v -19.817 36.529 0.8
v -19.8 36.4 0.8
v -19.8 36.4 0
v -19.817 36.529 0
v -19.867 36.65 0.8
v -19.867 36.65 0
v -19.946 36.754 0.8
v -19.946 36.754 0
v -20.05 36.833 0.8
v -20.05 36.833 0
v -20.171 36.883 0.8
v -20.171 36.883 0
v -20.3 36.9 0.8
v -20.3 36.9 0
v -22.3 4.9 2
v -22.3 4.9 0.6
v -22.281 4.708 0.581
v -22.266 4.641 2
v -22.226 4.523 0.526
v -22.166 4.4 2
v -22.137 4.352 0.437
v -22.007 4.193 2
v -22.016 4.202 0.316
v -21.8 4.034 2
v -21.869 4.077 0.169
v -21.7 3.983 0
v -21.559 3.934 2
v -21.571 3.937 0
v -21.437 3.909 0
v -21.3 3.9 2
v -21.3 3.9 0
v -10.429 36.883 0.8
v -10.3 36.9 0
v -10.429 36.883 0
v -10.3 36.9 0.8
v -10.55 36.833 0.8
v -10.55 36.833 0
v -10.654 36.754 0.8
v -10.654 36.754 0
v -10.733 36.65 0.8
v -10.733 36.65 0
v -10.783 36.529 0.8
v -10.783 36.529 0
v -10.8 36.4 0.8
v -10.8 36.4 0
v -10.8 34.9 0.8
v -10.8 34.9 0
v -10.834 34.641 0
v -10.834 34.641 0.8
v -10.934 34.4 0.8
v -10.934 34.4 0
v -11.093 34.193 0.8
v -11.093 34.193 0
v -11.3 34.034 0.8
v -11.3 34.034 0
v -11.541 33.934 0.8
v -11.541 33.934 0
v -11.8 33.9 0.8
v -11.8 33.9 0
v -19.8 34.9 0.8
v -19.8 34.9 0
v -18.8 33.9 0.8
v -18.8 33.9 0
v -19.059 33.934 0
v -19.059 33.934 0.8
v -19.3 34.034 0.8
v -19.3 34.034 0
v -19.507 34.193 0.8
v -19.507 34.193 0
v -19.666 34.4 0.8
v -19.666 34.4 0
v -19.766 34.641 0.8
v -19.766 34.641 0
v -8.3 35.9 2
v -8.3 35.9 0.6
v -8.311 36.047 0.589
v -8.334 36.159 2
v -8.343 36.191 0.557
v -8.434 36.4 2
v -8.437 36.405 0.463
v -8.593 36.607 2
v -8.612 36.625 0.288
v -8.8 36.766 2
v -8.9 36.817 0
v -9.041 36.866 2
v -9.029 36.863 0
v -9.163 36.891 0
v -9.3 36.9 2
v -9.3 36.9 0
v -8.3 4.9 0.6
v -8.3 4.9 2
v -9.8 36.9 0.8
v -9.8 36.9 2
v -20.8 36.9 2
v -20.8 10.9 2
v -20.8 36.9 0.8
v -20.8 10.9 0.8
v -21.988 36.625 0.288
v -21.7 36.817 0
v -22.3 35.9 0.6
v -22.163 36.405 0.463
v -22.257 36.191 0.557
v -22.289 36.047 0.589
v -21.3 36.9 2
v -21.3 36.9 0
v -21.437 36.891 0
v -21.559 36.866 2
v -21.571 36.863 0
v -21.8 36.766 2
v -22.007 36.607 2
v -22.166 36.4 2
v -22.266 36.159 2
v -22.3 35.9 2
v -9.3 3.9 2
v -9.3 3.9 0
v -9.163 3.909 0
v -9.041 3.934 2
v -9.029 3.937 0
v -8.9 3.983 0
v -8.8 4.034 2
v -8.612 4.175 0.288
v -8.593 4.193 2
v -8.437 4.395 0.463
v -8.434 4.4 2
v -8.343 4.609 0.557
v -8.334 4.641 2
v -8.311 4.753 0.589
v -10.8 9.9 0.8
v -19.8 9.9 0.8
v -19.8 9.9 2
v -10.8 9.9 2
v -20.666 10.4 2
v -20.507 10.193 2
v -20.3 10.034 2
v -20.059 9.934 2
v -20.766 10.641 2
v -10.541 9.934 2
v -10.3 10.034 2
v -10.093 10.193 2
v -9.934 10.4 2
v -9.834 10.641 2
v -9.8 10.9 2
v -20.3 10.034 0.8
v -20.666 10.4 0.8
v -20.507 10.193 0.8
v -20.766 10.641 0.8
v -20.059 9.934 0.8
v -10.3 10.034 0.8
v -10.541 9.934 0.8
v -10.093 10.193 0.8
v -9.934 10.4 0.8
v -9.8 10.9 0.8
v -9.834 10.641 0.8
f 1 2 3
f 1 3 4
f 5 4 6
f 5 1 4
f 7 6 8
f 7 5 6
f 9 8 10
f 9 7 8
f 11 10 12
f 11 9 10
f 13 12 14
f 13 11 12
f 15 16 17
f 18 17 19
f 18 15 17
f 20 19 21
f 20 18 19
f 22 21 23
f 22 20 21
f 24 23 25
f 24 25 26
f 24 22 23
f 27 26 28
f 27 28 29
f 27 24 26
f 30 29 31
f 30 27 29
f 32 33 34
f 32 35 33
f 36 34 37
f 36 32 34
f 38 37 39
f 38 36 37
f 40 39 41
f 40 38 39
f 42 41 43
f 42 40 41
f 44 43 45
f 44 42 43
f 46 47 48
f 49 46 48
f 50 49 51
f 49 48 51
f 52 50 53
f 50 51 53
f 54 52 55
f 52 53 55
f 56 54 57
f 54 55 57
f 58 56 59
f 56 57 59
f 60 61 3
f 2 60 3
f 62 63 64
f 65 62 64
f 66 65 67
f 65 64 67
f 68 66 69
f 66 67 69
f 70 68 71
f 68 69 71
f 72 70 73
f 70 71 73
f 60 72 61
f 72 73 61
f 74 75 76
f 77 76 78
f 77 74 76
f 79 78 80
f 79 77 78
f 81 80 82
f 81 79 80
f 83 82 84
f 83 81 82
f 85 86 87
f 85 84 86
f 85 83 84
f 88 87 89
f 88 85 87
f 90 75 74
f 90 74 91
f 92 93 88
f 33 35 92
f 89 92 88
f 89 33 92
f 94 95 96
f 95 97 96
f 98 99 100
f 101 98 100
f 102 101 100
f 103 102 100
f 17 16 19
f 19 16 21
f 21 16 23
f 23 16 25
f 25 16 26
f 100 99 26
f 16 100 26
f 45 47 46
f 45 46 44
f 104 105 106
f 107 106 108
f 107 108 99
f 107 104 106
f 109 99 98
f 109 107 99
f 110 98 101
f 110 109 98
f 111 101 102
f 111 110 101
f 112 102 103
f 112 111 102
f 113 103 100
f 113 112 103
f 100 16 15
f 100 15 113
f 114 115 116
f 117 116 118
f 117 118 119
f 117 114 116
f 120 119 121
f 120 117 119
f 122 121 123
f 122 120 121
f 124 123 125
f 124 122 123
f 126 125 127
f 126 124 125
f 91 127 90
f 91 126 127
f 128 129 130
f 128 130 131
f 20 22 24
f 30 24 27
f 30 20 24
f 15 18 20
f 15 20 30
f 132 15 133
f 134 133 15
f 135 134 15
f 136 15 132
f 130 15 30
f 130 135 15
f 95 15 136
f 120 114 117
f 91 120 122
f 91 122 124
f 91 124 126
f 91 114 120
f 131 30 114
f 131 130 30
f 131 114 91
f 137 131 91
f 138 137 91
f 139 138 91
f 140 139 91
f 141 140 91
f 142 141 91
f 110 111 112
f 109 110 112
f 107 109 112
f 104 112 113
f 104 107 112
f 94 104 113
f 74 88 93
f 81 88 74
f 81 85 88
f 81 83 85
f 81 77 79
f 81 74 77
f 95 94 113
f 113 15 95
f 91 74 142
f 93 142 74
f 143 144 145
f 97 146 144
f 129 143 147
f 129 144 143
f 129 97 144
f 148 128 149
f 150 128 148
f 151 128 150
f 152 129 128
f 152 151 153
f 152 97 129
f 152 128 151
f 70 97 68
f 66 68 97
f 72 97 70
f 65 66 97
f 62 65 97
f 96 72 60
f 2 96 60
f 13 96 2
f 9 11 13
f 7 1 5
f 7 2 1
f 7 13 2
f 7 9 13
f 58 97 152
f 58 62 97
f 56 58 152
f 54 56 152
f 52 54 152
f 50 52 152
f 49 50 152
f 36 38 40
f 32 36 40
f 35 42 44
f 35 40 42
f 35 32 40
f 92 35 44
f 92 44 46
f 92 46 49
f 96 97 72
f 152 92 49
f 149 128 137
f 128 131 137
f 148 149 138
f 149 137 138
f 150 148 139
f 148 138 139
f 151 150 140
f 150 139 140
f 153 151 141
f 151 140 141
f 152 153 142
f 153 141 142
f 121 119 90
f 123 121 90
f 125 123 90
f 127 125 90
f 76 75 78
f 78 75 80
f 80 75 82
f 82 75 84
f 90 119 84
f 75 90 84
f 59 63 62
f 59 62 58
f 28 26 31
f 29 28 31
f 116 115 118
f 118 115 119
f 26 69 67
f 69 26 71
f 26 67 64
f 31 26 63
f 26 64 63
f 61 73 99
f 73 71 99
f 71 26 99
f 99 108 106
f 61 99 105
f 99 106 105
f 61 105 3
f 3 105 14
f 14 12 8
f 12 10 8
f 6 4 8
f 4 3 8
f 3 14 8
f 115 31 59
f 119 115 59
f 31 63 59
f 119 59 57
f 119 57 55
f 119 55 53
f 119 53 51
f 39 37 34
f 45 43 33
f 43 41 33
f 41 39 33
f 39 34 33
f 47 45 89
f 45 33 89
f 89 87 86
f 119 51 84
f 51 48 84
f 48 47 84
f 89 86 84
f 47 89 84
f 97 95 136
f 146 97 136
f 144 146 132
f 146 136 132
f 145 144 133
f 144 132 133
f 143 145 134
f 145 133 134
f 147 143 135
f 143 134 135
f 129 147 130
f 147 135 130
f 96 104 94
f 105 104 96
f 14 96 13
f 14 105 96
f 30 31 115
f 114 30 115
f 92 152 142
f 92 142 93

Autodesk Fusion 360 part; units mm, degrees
sketch "mriya-niceview-holder" plane through (0, 0, 0) normal (0, 0, 1) x (1, 0, 0)
  line L0 (-20.8, 9.9) -> (-9.8, 9.9)
  line L1 (-9.8, 9.9) -> (-9.8, 36.9)
  line L2 (-22.3, 3.9) -> (-22.3, 36.9)
  line L3 (-20.8, 9.9) -> (-20.8, 36.9)
  line L4 (-8.3, 36.9) -> (-8.3, 3.9)
  line L5 (-22.3, 36.9) -> (-19.8, 36.9)
  line L6 (-22.3, 3.9) -> (-8.3, 3.9)
  arc A0 (-19.8, 34.9) -> (-18.8, 33.9) centre (-18.8, 34.9) ccw
  line L7 (-10.8, 36.9) -> (-8.3, 36.9)
  arc A1 (-11.8, 33.9) -> (-10.8, 34.9) centre (-11.8, 34.9) ccw
  line L8 (-10.8, 34.9) -> (-10.8, 36.9)
  line L9 (-18.8, 33.9) -> (-11.8, 33.9)
  line L10 (-19.8, 34.9) -> (-19.8, 36.9)
extrude "Extrude1" add sketch "mriya-niceview-holder" along normal blind 2 contours L0 L1 L2 L3 L4 L5 L6 L7
extrude "Extrude2" add sketch "mriya-niceview-holder" along normal blind 0.8 contours L0 L1 L3 L5 A0 L7 A1 L8 L9 L10
chamfer "Chamfer4" distance 0.6 angle 45 2 edges at (-22.3, 20.4, 0) (-8.3, 20.4, 0)
fillet "Fillet1" radius 1 4 edges at (-8.3, 3.9, 1) (-22.3, 3.9, 1) (-8.3, 36.9, 1) (-22.3, 36.9, 1)
fillet "Fillet2" radius 0.5 2 edges at (-10.8, 36.9, 0.4) (-19.8, 36.9, 0.4)
fillet "Fillet3" radius 1 2 edges at (-20.8, 9.9, 1.4) (-9.8, 9.9, 1.4)
